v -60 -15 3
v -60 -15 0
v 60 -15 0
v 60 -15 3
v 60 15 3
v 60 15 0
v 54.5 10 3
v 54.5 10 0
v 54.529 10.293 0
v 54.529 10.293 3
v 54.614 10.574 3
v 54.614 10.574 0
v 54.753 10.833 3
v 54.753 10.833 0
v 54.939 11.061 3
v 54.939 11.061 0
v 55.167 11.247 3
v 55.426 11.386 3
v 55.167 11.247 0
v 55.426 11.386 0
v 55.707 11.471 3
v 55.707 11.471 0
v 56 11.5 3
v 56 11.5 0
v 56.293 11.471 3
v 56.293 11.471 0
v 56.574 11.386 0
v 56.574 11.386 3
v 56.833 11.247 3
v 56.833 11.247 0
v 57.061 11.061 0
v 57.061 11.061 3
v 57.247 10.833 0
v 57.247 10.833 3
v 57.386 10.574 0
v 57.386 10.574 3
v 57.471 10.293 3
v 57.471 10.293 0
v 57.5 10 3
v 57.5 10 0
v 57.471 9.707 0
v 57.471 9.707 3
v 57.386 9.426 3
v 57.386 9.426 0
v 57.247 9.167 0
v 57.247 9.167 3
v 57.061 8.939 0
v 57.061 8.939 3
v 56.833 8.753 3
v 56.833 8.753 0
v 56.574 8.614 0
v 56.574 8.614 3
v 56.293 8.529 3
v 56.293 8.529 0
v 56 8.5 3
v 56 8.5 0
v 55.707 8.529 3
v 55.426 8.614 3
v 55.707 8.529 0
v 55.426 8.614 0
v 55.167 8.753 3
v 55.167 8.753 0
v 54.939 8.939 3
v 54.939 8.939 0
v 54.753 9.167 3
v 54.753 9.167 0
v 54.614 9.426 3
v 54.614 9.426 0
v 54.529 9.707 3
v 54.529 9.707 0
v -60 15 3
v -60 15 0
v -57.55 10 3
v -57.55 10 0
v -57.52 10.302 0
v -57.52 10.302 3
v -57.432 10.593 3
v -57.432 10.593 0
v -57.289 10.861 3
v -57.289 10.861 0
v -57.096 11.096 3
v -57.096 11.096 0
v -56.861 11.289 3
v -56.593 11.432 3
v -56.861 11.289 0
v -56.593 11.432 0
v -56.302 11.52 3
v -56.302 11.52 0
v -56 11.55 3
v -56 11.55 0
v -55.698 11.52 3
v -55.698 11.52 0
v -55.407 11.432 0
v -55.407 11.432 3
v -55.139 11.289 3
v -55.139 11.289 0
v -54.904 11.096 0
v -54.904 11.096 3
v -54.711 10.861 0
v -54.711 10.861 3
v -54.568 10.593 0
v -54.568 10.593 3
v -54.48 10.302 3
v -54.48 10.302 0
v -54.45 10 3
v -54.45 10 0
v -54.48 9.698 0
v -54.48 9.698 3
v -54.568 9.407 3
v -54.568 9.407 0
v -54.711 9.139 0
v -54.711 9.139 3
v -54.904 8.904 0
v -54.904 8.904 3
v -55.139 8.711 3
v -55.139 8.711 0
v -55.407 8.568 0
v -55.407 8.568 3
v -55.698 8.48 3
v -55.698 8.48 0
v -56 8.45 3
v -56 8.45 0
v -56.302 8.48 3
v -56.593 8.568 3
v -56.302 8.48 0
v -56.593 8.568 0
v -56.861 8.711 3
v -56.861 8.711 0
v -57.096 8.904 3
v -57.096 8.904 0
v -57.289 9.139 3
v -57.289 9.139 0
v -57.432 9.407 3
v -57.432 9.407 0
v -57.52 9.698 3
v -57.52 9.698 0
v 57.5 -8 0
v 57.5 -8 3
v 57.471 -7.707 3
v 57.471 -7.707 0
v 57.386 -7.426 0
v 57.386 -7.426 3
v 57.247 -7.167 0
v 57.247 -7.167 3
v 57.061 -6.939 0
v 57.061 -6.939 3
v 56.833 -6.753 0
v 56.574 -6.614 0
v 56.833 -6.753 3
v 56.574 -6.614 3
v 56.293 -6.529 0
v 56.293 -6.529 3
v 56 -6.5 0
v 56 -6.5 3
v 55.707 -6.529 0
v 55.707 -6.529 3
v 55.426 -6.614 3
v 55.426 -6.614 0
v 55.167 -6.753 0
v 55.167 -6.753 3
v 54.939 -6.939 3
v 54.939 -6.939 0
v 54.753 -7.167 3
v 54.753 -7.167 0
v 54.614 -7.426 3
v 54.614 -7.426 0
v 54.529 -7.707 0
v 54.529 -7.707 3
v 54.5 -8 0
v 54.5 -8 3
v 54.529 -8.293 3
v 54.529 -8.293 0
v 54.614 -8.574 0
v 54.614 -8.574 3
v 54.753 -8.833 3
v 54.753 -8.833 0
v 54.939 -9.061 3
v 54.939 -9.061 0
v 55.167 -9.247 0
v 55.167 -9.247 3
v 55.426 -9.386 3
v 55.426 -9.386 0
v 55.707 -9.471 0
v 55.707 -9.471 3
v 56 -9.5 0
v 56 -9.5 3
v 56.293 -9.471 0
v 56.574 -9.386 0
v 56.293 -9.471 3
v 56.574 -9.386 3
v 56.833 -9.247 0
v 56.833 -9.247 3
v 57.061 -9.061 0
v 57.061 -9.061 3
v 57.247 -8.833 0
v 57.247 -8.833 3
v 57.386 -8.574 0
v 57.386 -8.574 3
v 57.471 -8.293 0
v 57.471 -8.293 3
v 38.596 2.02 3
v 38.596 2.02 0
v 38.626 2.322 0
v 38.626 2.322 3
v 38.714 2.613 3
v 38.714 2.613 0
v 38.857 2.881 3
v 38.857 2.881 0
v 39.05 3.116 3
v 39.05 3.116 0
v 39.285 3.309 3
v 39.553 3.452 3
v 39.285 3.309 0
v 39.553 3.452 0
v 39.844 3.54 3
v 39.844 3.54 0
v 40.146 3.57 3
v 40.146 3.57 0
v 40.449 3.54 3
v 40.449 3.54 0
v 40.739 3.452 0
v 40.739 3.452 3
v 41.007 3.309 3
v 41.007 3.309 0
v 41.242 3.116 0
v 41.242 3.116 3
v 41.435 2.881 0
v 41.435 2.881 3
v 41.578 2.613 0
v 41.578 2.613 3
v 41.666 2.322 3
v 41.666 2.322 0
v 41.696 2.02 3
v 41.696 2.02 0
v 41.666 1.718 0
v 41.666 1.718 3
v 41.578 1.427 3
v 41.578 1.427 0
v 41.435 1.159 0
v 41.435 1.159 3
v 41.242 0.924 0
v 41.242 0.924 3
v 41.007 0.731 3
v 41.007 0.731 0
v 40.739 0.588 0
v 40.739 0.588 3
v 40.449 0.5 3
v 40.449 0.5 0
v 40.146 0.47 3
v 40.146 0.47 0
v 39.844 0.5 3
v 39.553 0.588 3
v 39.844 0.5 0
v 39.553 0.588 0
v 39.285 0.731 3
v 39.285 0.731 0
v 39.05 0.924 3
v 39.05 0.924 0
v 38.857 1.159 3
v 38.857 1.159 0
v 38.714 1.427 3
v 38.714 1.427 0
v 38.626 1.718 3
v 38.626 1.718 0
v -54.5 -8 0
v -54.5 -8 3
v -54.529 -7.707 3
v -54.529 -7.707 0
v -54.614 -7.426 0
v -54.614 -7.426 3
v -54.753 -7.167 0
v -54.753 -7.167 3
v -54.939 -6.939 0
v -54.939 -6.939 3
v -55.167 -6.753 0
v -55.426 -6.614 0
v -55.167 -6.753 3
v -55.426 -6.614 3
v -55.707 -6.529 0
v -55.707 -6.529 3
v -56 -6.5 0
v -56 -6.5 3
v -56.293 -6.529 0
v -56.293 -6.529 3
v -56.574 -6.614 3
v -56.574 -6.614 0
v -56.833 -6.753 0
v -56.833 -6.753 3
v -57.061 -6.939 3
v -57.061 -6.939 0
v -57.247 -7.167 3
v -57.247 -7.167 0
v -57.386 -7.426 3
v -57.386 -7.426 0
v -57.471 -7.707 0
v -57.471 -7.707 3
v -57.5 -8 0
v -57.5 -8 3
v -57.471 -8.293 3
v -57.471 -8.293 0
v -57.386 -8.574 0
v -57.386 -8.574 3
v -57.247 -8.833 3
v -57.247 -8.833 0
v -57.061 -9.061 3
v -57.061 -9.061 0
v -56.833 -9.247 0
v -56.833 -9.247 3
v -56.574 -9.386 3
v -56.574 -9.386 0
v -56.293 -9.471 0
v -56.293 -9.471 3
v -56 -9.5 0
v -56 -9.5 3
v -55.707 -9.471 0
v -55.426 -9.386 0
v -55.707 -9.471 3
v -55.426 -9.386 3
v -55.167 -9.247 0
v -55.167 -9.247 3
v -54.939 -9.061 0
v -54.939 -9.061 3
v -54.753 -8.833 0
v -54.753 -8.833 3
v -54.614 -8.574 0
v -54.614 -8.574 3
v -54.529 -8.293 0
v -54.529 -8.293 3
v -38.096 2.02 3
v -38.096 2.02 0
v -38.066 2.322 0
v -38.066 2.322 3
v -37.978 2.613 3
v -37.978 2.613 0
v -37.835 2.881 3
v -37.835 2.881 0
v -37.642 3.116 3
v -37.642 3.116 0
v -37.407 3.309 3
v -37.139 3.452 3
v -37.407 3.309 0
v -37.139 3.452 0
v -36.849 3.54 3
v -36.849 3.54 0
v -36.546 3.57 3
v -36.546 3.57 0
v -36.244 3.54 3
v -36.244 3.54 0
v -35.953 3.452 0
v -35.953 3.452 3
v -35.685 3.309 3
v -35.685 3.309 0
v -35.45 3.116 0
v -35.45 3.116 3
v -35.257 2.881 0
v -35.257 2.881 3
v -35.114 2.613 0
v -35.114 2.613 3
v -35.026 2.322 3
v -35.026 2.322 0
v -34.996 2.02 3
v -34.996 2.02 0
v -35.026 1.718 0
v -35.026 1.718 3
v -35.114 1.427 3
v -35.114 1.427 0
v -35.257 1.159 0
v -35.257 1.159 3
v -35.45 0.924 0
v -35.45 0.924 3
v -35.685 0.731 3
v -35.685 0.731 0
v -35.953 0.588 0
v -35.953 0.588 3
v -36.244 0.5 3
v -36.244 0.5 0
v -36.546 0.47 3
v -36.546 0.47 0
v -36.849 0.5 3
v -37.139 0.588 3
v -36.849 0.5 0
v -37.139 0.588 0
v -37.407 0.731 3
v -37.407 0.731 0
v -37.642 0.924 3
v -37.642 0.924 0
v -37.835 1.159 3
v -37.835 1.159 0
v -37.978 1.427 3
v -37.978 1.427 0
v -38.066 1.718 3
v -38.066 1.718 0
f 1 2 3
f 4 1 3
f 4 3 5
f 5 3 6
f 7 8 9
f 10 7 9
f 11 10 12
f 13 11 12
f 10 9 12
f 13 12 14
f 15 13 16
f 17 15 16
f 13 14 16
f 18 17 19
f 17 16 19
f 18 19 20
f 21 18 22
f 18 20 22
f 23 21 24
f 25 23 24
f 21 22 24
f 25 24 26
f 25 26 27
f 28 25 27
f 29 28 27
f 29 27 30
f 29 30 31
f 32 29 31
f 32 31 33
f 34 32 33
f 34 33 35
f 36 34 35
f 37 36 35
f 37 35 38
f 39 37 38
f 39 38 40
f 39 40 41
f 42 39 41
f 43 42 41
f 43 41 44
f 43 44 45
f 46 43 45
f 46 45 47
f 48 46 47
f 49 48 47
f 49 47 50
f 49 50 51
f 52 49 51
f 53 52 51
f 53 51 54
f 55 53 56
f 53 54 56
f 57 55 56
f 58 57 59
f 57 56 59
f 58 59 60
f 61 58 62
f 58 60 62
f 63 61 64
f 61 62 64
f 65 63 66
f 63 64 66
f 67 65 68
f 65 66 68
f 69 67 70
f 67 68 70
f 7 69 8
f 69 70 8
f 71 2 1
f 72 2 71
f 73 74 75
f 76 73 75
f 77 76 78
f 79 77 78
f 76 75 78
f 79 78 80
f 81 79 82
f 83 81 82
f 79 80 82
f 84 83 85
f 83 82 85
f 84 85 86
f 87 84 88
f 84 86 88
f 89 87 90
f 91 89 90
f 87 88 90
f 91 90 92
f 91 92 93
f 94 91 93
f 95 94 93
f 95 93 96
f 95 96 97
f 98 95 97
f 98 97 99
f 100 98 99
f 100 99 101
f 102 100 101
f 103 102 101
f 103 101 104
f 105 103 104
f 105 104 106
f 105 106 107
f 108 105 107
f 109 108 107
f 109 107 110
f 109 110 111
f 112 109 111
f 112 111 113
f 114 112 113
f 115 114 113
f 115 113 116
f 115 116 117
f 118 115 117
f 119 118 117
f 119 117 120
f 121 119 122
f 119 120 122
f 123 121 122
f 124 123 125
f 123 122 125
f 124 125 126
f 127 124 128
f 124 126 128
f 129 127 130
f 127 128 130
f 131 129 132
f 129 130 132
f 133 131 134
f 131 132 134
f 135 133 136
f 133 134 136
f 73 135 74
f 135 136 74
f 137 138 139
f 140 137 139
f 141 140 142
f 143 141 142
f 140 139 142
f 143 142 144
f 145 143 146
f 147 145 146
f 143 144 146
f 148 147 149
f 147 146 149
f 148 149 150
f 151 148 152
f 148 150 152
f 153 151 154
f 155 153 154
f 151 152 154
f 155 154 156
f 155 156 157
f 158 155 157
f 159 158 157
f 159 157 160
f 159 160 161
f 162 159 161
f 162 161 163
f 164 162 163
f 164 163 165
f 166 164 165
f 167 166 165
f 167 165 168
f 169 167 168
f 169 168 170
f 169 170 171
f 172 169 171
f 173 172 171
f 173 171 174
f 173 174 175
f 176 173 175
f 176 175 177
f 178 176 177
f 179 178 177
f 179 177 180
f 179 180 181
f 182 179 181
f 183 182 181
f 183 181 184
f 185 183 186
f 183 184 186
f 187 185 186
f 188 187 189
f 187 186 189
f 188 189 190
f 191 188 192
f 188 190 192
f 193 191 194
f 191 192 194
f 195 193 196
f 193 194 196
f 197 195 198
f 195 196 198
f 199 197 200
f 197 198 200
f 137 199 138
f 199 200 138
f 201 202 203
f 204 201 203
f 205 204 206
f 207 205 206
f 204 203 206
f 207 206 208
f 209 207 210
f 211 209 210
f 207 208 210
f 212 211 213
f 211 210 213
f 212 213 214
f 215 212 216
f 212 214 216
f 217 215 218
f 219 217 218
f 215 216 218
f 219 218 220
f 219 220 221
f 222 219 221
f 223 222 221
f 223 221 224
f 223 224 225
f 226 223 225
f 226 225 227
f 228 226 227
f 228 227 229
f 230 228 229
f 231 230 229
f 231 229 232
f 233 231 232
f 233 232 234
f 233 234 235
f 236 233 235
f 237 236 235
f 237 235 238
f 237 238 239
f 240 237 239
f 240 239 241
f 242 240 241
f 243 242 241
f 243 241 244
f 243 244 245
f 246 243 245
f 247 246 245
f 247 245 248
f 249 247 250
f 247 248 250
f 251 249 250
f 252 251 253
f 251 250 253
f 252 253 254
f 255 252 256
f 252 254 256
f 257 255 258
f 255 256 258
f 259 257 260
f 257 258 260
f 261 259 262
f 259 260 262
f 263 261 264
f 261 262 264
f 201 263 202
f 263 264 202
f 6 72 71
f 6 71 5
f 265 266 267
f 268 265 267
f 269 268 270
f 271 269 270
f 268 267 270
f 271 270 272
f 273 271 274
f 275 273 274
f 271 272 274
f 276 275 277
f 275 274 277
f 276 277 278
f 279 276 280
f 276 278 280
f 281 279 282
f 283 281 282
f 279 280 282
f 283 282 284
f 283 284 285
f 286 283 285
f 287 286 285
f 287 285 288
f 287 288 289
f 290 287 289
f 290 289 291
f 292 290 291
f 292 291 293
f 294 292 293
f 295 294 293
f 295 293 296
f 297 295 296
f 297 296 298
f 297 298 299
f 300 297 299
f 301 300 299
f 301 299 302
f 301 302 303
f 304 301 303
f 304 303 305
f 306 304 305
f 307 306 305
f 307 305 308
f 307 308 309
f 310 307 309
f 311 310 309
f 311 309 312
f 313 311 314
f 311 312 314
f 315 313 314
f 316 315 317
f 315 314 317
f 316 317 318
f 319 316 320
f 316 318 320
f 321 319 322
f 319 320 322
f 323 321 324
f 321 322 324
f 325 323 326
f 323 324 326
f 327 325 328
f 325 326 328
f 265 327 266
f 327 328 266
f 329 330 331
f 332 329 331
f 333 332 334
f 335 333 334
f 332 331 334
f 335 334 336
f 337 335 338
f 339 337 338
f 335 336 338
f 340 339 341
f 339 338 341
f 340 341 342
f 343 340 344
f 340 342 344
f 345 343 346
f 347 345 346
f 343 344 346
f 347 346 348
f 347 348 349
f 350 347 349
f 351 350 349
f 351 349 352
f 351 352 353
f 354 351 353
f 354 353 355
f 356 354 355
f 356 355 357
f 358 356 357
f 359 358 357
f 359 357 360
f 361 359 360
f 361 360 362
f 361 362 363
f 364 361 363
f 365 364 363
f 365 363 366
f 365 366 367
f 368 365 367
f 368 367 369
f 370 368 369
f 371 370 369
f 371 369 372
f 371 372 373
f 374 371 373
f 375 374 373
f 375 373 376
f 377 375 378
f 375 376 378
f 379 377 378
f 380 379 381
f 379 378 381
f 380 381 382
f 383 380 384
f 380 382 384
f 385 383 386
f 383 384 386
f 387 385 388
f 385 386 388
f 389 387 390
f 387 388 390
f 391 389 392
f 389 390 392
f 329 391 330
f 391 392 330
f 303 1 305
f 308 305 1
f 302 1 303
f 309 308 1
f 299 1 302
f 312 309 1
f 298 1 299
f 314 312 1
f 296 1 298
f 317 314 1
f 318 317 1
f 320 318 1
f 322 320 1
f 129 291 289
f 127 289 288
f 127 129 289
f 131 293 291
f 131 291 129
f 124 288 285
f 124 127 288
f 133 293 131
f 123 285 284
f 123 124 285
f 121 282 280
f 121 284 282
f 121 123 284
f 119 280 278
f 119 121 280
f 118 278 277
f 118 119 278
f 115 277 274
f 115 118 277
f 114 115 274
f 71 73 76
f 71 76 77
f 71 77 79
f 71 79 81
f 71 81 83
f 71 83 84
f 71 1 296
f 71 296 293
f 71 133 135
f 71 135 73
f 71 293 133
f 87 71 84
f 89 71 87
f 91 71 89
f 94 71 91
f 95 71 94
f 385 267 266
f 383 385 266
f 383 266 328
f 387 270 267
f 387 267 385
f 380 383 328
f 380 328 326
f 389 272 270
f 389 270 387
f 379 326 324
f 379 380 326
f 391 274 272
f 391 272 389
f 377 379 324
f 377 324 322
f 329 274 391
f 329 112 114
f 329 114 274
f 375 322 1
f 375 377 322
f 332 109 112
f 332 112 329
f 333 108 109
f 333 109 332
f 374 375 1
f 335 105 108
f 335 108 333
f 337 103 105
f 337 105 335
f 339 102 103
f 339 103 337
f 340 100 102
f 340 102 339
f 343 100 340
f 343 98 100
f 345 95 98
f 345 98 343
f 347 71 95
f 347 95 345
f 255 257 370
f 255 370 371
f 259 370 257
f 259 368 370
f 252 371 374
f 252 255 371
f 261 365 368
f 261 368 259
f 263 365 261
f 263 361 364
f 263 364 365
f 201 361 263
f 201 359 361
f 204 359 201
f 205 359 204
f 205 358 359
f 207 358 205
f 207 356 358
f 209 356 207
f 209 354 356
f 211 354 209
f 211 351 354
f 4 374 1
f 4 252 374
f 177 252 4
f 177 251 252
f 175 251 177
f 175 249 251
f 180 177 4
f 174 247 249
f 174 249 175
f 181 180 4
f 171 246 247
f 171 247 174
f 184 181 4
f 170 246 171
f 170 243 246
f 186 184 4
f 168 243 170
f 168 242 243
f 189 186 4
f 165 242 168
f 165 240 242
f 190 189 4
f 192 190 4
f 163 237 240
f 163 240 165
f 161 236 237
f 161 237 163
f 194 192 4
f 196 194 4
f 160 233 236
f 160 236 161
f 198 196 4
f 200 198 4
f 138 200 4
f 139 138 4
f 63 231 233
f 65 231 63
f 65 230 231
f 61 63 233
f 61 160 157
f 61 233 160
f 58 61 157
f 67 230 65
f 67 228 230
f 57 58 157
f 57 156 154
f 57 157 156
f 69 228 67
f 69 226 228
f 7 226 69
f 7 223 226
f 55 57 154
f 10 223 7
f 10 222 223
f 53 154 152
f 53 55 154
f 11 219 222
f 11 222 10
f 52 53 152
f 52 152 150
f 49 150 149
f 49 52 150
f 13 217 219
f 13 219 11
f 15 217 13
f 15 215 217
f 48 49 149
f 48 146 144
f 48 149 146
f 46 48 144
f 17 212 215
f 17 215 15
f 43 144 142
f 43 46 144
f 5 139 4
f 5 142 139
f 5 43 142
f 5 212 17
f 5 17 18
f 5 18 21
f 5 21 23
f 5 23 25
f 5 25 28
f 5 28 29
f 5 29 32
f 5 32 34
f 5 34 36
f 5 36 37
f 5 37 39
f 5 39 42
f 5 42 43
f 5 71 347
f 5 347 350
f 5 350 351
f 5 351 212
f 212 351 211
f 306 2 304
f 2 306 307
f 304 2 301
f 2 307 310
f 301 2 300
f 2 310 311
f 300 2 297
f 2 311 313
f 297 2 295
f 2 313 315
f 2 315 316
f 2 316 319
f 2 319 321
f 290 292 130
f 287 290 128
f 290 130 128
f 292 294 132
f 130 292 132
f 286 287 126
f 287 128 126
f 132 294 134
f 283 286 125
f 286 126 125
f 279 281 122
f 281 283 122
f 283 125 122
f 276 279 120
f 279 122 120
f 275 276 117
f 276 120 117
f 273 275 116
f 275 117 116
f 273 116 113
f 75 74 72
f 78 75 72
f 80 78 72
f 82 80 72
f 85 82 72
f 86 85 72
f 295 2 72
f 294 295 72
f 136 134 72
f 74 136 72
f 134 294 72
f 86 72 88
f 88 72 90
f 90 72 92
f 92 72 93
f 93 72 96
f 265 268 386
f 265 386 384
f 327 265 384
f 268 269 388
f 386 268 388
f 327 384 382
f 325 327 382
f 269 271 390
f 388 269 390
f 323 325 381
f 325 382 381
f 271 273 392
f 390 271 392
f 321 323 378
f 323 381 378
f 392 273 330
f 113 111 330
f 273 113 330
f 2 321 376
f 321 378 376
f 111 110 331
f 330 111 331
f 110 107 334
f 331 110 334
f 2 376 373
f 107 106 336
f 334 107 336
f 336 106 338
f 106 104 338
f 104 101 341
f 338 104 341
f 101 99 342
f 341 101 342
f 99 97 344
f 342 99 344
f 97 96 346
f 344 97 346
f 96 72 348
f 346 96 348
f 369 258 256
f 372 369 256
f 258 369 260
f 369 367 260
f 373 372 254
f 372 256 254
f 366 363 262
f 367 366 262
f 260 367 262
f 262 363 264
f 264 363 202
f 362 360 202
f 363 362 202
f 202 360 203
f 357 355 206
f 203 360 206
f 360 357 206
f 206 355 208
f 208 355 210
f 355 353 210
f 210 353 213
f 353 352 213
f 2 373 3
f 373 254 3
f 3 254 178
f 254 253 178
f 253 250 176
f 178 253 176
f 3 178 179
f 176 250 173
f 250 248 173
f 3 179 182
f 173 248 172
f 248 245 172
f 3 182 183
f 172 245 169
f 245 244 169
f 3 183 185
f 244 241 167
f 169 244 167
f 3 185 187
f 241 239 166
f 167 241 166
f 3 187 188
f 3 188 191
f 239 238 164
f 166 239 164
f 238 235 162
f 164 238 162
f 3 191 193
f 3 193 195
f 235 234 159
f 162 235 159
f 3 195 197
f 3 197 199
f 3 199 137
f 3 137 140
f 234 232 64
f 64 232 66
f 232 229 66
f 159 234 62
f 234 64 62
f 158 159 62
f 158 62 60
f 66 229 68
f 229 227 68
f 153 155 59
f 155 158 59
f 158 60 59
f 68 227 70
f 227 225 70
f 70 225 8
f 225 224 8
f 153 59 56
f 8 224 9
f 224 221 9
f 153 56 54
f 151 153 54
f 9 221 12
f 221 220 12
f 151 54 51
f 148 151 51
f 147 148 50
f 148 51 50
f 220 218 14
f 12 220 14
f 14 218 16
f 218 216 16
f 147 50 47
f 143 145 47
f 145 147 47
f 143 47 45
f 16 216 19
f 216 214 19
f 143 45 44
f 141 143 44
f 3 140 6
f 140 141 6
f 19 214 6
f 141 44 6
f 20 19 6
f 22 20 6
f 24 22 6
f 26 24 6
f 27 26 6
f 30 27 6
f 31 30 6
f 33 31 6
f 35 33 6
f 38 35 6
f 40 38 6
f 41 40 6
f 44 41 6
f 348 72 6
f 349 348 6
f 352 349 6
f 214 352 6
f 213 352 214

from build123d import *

# Parameters (mm, degrees)
SKETCH_1_W          = 120
SKETCH_1_H          = 30
EXTRUDE_1_DEPTH     = 3
SKETCH_3_R          = 1.5
SKETCH_3_R_2        = 1.55
CUT_EXTRUDE_2_DEPTH = 10
SKETCH_6_R          = 1.5
CUT_EXTRUDE_3_DEPTH = 10
SKETCH_8_R          = 1.55
CUT_EXTRUDE_4_DEPTH = 62.919302322


with BuildPart() as part:
    # 草图1 → 凸台-拉伸1 (new body)
    with BuildSketch(Plane.XY):
        Rectangle(SKETCH_1_W, SKETCH_1_H)
    extrude(amount=EXTRUDE_1_DEPTH)

    # 草图3 → 切除-拉伸2 (cut)
    with BuildSketch(Plane(origin=(0, 0, 0), x_dir=(-1, 0, 0), z_dir=(0, 0, -1))):
        with Locations((-56, 10)):
            Circle(SKETCH_3_R)
        with Locations((56, 10)):
            Circle(SKETCH_3_R_2)
    extrude(amount=-CUT_EXTRUDE_2_DEPTH, mode=Mode.SUBTRACT)

    # 草图6 → 切除-拉伸3 (cut)
    with BuildSketch(Plane.XY.offset(3)):
        with Locations((-56, -8)):
            Circle(SKETCH_6_R)
        with Locations((56, -8)):
            Circle(SKETCH_6_R)
    extrude(amount=-CUT_EXTRUDE_3_DEPTH, mode=Mode.SUBTRACT)

    # 草图8 → 切除-拉伸4 (cut, through all)
    with BuildSketch(Plane(origin=(0, 0, 0), x_dir=(-1, 0, 0), z_dir=(0, 0, -1))):
        with Locations((-40.146260884, 2.02)):
            Circle(SKETCH_8_R)
        with Locations((36.546260884, 2.02)):
            Circle(SKETCH_8_R)
    extrude(amount=-CUT_EXTRUDE_4_DEPTH, mode=Mode.SUBTRACT)


solid = part.part
